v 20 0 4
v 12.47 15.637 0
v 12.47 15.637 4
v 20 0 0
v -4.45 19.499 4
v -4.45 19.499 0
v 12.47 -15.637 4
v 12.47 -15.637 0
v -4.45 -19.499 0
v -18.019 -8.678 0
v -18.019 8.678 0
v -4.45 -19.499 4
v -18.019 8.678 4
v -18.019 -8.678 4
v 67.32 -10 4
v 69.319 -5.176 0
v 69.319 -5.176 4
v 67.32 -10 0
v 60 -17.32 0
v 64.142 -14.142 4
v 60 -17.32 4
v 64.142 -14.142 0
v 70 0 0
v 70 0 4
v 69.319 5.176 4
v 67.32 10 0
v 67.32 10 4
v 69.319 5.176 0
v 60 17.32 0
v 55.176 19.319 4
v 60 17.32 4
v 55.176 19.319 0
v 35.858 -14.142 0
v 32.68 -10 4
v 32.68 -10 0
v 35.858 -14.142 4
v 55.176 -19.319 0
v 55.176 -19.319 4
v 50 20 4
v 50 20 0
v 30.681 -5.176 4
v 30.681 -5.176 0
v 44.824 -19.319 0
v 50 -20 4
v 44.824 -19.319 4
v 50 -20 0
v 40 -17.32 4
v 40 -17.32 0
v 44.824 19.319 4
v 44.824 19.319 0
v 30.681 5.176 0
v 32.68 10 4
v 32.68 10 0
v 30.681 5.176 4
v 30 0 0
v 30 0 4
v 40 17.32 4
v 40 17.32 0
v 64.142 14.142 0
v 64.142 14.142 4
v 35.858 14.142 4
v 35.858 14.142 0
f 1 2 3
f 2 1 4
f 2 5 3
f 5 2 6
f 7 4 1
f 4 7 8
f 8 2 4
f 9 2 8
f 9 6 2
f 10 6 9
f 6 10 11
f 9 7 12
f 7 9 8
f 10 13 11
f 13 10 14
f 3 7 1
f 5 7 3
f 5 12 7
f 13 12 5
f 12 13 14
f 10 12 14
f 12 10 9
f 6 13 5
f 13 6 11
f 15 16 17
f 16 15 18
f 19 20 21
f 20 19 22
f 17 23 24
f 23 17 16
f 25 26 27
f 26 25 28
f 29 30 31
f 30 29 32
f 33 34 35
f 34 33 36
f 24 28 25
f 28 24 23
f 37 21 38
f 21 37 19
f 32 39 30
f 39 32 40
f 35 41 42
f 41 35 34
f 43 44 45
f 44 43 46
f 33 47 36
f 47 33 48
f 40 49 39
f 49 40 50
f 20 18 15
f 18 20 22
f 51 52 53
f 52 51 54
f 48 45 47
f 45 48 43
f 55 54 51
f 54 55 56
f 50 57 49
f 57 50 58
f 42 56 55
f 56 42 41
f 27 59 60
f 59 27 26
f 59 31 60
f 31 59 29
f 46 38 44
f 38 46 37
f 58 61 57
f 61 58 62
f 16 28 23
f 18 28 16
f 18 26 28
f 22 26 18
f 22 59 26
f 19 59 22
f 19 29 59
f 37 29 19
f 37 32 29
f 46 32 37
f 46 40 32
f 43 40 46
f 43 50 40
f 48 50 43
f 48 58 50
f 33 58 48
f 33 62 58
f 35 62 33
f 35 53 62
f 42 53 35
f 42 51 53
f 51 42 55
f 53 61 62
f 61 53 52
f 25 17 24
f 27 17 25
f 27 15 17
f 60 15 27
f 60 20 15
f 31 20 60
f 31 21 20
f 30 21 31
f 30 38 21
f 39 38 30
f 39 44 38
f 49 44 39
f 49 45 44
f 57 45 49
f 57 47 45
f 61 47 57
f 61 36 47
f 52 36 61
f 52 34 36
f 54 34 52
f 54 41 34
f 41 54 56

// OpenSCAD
// Building lists: for, if and each inside [ ].

squares = [for (i = [1 : 6]) i * i];
echo(squares);

// `if` filters; there is no else needed to skip a value.
evens = [for (i = [1 : 20]) if (i % 2 == 0) i];
echo(evens);

// `each` flattens one level, so a nested generator does not nest the list.
pairs = [for (i = [1 : 3]) each [i, -i]];
echo(pairs);

// The usual reason to want them: generating a polygon.
function ring(n, r) = [for (i = [0 : n - 1]) let (a = i * 360 / n)
                       [r * cos(a), r * sin(a)]];

linear_extrude(4) polygon(ring(7, 20));
translate([50, 0, 0]) linear_extrude(4) polygon(ring(24, 20));
